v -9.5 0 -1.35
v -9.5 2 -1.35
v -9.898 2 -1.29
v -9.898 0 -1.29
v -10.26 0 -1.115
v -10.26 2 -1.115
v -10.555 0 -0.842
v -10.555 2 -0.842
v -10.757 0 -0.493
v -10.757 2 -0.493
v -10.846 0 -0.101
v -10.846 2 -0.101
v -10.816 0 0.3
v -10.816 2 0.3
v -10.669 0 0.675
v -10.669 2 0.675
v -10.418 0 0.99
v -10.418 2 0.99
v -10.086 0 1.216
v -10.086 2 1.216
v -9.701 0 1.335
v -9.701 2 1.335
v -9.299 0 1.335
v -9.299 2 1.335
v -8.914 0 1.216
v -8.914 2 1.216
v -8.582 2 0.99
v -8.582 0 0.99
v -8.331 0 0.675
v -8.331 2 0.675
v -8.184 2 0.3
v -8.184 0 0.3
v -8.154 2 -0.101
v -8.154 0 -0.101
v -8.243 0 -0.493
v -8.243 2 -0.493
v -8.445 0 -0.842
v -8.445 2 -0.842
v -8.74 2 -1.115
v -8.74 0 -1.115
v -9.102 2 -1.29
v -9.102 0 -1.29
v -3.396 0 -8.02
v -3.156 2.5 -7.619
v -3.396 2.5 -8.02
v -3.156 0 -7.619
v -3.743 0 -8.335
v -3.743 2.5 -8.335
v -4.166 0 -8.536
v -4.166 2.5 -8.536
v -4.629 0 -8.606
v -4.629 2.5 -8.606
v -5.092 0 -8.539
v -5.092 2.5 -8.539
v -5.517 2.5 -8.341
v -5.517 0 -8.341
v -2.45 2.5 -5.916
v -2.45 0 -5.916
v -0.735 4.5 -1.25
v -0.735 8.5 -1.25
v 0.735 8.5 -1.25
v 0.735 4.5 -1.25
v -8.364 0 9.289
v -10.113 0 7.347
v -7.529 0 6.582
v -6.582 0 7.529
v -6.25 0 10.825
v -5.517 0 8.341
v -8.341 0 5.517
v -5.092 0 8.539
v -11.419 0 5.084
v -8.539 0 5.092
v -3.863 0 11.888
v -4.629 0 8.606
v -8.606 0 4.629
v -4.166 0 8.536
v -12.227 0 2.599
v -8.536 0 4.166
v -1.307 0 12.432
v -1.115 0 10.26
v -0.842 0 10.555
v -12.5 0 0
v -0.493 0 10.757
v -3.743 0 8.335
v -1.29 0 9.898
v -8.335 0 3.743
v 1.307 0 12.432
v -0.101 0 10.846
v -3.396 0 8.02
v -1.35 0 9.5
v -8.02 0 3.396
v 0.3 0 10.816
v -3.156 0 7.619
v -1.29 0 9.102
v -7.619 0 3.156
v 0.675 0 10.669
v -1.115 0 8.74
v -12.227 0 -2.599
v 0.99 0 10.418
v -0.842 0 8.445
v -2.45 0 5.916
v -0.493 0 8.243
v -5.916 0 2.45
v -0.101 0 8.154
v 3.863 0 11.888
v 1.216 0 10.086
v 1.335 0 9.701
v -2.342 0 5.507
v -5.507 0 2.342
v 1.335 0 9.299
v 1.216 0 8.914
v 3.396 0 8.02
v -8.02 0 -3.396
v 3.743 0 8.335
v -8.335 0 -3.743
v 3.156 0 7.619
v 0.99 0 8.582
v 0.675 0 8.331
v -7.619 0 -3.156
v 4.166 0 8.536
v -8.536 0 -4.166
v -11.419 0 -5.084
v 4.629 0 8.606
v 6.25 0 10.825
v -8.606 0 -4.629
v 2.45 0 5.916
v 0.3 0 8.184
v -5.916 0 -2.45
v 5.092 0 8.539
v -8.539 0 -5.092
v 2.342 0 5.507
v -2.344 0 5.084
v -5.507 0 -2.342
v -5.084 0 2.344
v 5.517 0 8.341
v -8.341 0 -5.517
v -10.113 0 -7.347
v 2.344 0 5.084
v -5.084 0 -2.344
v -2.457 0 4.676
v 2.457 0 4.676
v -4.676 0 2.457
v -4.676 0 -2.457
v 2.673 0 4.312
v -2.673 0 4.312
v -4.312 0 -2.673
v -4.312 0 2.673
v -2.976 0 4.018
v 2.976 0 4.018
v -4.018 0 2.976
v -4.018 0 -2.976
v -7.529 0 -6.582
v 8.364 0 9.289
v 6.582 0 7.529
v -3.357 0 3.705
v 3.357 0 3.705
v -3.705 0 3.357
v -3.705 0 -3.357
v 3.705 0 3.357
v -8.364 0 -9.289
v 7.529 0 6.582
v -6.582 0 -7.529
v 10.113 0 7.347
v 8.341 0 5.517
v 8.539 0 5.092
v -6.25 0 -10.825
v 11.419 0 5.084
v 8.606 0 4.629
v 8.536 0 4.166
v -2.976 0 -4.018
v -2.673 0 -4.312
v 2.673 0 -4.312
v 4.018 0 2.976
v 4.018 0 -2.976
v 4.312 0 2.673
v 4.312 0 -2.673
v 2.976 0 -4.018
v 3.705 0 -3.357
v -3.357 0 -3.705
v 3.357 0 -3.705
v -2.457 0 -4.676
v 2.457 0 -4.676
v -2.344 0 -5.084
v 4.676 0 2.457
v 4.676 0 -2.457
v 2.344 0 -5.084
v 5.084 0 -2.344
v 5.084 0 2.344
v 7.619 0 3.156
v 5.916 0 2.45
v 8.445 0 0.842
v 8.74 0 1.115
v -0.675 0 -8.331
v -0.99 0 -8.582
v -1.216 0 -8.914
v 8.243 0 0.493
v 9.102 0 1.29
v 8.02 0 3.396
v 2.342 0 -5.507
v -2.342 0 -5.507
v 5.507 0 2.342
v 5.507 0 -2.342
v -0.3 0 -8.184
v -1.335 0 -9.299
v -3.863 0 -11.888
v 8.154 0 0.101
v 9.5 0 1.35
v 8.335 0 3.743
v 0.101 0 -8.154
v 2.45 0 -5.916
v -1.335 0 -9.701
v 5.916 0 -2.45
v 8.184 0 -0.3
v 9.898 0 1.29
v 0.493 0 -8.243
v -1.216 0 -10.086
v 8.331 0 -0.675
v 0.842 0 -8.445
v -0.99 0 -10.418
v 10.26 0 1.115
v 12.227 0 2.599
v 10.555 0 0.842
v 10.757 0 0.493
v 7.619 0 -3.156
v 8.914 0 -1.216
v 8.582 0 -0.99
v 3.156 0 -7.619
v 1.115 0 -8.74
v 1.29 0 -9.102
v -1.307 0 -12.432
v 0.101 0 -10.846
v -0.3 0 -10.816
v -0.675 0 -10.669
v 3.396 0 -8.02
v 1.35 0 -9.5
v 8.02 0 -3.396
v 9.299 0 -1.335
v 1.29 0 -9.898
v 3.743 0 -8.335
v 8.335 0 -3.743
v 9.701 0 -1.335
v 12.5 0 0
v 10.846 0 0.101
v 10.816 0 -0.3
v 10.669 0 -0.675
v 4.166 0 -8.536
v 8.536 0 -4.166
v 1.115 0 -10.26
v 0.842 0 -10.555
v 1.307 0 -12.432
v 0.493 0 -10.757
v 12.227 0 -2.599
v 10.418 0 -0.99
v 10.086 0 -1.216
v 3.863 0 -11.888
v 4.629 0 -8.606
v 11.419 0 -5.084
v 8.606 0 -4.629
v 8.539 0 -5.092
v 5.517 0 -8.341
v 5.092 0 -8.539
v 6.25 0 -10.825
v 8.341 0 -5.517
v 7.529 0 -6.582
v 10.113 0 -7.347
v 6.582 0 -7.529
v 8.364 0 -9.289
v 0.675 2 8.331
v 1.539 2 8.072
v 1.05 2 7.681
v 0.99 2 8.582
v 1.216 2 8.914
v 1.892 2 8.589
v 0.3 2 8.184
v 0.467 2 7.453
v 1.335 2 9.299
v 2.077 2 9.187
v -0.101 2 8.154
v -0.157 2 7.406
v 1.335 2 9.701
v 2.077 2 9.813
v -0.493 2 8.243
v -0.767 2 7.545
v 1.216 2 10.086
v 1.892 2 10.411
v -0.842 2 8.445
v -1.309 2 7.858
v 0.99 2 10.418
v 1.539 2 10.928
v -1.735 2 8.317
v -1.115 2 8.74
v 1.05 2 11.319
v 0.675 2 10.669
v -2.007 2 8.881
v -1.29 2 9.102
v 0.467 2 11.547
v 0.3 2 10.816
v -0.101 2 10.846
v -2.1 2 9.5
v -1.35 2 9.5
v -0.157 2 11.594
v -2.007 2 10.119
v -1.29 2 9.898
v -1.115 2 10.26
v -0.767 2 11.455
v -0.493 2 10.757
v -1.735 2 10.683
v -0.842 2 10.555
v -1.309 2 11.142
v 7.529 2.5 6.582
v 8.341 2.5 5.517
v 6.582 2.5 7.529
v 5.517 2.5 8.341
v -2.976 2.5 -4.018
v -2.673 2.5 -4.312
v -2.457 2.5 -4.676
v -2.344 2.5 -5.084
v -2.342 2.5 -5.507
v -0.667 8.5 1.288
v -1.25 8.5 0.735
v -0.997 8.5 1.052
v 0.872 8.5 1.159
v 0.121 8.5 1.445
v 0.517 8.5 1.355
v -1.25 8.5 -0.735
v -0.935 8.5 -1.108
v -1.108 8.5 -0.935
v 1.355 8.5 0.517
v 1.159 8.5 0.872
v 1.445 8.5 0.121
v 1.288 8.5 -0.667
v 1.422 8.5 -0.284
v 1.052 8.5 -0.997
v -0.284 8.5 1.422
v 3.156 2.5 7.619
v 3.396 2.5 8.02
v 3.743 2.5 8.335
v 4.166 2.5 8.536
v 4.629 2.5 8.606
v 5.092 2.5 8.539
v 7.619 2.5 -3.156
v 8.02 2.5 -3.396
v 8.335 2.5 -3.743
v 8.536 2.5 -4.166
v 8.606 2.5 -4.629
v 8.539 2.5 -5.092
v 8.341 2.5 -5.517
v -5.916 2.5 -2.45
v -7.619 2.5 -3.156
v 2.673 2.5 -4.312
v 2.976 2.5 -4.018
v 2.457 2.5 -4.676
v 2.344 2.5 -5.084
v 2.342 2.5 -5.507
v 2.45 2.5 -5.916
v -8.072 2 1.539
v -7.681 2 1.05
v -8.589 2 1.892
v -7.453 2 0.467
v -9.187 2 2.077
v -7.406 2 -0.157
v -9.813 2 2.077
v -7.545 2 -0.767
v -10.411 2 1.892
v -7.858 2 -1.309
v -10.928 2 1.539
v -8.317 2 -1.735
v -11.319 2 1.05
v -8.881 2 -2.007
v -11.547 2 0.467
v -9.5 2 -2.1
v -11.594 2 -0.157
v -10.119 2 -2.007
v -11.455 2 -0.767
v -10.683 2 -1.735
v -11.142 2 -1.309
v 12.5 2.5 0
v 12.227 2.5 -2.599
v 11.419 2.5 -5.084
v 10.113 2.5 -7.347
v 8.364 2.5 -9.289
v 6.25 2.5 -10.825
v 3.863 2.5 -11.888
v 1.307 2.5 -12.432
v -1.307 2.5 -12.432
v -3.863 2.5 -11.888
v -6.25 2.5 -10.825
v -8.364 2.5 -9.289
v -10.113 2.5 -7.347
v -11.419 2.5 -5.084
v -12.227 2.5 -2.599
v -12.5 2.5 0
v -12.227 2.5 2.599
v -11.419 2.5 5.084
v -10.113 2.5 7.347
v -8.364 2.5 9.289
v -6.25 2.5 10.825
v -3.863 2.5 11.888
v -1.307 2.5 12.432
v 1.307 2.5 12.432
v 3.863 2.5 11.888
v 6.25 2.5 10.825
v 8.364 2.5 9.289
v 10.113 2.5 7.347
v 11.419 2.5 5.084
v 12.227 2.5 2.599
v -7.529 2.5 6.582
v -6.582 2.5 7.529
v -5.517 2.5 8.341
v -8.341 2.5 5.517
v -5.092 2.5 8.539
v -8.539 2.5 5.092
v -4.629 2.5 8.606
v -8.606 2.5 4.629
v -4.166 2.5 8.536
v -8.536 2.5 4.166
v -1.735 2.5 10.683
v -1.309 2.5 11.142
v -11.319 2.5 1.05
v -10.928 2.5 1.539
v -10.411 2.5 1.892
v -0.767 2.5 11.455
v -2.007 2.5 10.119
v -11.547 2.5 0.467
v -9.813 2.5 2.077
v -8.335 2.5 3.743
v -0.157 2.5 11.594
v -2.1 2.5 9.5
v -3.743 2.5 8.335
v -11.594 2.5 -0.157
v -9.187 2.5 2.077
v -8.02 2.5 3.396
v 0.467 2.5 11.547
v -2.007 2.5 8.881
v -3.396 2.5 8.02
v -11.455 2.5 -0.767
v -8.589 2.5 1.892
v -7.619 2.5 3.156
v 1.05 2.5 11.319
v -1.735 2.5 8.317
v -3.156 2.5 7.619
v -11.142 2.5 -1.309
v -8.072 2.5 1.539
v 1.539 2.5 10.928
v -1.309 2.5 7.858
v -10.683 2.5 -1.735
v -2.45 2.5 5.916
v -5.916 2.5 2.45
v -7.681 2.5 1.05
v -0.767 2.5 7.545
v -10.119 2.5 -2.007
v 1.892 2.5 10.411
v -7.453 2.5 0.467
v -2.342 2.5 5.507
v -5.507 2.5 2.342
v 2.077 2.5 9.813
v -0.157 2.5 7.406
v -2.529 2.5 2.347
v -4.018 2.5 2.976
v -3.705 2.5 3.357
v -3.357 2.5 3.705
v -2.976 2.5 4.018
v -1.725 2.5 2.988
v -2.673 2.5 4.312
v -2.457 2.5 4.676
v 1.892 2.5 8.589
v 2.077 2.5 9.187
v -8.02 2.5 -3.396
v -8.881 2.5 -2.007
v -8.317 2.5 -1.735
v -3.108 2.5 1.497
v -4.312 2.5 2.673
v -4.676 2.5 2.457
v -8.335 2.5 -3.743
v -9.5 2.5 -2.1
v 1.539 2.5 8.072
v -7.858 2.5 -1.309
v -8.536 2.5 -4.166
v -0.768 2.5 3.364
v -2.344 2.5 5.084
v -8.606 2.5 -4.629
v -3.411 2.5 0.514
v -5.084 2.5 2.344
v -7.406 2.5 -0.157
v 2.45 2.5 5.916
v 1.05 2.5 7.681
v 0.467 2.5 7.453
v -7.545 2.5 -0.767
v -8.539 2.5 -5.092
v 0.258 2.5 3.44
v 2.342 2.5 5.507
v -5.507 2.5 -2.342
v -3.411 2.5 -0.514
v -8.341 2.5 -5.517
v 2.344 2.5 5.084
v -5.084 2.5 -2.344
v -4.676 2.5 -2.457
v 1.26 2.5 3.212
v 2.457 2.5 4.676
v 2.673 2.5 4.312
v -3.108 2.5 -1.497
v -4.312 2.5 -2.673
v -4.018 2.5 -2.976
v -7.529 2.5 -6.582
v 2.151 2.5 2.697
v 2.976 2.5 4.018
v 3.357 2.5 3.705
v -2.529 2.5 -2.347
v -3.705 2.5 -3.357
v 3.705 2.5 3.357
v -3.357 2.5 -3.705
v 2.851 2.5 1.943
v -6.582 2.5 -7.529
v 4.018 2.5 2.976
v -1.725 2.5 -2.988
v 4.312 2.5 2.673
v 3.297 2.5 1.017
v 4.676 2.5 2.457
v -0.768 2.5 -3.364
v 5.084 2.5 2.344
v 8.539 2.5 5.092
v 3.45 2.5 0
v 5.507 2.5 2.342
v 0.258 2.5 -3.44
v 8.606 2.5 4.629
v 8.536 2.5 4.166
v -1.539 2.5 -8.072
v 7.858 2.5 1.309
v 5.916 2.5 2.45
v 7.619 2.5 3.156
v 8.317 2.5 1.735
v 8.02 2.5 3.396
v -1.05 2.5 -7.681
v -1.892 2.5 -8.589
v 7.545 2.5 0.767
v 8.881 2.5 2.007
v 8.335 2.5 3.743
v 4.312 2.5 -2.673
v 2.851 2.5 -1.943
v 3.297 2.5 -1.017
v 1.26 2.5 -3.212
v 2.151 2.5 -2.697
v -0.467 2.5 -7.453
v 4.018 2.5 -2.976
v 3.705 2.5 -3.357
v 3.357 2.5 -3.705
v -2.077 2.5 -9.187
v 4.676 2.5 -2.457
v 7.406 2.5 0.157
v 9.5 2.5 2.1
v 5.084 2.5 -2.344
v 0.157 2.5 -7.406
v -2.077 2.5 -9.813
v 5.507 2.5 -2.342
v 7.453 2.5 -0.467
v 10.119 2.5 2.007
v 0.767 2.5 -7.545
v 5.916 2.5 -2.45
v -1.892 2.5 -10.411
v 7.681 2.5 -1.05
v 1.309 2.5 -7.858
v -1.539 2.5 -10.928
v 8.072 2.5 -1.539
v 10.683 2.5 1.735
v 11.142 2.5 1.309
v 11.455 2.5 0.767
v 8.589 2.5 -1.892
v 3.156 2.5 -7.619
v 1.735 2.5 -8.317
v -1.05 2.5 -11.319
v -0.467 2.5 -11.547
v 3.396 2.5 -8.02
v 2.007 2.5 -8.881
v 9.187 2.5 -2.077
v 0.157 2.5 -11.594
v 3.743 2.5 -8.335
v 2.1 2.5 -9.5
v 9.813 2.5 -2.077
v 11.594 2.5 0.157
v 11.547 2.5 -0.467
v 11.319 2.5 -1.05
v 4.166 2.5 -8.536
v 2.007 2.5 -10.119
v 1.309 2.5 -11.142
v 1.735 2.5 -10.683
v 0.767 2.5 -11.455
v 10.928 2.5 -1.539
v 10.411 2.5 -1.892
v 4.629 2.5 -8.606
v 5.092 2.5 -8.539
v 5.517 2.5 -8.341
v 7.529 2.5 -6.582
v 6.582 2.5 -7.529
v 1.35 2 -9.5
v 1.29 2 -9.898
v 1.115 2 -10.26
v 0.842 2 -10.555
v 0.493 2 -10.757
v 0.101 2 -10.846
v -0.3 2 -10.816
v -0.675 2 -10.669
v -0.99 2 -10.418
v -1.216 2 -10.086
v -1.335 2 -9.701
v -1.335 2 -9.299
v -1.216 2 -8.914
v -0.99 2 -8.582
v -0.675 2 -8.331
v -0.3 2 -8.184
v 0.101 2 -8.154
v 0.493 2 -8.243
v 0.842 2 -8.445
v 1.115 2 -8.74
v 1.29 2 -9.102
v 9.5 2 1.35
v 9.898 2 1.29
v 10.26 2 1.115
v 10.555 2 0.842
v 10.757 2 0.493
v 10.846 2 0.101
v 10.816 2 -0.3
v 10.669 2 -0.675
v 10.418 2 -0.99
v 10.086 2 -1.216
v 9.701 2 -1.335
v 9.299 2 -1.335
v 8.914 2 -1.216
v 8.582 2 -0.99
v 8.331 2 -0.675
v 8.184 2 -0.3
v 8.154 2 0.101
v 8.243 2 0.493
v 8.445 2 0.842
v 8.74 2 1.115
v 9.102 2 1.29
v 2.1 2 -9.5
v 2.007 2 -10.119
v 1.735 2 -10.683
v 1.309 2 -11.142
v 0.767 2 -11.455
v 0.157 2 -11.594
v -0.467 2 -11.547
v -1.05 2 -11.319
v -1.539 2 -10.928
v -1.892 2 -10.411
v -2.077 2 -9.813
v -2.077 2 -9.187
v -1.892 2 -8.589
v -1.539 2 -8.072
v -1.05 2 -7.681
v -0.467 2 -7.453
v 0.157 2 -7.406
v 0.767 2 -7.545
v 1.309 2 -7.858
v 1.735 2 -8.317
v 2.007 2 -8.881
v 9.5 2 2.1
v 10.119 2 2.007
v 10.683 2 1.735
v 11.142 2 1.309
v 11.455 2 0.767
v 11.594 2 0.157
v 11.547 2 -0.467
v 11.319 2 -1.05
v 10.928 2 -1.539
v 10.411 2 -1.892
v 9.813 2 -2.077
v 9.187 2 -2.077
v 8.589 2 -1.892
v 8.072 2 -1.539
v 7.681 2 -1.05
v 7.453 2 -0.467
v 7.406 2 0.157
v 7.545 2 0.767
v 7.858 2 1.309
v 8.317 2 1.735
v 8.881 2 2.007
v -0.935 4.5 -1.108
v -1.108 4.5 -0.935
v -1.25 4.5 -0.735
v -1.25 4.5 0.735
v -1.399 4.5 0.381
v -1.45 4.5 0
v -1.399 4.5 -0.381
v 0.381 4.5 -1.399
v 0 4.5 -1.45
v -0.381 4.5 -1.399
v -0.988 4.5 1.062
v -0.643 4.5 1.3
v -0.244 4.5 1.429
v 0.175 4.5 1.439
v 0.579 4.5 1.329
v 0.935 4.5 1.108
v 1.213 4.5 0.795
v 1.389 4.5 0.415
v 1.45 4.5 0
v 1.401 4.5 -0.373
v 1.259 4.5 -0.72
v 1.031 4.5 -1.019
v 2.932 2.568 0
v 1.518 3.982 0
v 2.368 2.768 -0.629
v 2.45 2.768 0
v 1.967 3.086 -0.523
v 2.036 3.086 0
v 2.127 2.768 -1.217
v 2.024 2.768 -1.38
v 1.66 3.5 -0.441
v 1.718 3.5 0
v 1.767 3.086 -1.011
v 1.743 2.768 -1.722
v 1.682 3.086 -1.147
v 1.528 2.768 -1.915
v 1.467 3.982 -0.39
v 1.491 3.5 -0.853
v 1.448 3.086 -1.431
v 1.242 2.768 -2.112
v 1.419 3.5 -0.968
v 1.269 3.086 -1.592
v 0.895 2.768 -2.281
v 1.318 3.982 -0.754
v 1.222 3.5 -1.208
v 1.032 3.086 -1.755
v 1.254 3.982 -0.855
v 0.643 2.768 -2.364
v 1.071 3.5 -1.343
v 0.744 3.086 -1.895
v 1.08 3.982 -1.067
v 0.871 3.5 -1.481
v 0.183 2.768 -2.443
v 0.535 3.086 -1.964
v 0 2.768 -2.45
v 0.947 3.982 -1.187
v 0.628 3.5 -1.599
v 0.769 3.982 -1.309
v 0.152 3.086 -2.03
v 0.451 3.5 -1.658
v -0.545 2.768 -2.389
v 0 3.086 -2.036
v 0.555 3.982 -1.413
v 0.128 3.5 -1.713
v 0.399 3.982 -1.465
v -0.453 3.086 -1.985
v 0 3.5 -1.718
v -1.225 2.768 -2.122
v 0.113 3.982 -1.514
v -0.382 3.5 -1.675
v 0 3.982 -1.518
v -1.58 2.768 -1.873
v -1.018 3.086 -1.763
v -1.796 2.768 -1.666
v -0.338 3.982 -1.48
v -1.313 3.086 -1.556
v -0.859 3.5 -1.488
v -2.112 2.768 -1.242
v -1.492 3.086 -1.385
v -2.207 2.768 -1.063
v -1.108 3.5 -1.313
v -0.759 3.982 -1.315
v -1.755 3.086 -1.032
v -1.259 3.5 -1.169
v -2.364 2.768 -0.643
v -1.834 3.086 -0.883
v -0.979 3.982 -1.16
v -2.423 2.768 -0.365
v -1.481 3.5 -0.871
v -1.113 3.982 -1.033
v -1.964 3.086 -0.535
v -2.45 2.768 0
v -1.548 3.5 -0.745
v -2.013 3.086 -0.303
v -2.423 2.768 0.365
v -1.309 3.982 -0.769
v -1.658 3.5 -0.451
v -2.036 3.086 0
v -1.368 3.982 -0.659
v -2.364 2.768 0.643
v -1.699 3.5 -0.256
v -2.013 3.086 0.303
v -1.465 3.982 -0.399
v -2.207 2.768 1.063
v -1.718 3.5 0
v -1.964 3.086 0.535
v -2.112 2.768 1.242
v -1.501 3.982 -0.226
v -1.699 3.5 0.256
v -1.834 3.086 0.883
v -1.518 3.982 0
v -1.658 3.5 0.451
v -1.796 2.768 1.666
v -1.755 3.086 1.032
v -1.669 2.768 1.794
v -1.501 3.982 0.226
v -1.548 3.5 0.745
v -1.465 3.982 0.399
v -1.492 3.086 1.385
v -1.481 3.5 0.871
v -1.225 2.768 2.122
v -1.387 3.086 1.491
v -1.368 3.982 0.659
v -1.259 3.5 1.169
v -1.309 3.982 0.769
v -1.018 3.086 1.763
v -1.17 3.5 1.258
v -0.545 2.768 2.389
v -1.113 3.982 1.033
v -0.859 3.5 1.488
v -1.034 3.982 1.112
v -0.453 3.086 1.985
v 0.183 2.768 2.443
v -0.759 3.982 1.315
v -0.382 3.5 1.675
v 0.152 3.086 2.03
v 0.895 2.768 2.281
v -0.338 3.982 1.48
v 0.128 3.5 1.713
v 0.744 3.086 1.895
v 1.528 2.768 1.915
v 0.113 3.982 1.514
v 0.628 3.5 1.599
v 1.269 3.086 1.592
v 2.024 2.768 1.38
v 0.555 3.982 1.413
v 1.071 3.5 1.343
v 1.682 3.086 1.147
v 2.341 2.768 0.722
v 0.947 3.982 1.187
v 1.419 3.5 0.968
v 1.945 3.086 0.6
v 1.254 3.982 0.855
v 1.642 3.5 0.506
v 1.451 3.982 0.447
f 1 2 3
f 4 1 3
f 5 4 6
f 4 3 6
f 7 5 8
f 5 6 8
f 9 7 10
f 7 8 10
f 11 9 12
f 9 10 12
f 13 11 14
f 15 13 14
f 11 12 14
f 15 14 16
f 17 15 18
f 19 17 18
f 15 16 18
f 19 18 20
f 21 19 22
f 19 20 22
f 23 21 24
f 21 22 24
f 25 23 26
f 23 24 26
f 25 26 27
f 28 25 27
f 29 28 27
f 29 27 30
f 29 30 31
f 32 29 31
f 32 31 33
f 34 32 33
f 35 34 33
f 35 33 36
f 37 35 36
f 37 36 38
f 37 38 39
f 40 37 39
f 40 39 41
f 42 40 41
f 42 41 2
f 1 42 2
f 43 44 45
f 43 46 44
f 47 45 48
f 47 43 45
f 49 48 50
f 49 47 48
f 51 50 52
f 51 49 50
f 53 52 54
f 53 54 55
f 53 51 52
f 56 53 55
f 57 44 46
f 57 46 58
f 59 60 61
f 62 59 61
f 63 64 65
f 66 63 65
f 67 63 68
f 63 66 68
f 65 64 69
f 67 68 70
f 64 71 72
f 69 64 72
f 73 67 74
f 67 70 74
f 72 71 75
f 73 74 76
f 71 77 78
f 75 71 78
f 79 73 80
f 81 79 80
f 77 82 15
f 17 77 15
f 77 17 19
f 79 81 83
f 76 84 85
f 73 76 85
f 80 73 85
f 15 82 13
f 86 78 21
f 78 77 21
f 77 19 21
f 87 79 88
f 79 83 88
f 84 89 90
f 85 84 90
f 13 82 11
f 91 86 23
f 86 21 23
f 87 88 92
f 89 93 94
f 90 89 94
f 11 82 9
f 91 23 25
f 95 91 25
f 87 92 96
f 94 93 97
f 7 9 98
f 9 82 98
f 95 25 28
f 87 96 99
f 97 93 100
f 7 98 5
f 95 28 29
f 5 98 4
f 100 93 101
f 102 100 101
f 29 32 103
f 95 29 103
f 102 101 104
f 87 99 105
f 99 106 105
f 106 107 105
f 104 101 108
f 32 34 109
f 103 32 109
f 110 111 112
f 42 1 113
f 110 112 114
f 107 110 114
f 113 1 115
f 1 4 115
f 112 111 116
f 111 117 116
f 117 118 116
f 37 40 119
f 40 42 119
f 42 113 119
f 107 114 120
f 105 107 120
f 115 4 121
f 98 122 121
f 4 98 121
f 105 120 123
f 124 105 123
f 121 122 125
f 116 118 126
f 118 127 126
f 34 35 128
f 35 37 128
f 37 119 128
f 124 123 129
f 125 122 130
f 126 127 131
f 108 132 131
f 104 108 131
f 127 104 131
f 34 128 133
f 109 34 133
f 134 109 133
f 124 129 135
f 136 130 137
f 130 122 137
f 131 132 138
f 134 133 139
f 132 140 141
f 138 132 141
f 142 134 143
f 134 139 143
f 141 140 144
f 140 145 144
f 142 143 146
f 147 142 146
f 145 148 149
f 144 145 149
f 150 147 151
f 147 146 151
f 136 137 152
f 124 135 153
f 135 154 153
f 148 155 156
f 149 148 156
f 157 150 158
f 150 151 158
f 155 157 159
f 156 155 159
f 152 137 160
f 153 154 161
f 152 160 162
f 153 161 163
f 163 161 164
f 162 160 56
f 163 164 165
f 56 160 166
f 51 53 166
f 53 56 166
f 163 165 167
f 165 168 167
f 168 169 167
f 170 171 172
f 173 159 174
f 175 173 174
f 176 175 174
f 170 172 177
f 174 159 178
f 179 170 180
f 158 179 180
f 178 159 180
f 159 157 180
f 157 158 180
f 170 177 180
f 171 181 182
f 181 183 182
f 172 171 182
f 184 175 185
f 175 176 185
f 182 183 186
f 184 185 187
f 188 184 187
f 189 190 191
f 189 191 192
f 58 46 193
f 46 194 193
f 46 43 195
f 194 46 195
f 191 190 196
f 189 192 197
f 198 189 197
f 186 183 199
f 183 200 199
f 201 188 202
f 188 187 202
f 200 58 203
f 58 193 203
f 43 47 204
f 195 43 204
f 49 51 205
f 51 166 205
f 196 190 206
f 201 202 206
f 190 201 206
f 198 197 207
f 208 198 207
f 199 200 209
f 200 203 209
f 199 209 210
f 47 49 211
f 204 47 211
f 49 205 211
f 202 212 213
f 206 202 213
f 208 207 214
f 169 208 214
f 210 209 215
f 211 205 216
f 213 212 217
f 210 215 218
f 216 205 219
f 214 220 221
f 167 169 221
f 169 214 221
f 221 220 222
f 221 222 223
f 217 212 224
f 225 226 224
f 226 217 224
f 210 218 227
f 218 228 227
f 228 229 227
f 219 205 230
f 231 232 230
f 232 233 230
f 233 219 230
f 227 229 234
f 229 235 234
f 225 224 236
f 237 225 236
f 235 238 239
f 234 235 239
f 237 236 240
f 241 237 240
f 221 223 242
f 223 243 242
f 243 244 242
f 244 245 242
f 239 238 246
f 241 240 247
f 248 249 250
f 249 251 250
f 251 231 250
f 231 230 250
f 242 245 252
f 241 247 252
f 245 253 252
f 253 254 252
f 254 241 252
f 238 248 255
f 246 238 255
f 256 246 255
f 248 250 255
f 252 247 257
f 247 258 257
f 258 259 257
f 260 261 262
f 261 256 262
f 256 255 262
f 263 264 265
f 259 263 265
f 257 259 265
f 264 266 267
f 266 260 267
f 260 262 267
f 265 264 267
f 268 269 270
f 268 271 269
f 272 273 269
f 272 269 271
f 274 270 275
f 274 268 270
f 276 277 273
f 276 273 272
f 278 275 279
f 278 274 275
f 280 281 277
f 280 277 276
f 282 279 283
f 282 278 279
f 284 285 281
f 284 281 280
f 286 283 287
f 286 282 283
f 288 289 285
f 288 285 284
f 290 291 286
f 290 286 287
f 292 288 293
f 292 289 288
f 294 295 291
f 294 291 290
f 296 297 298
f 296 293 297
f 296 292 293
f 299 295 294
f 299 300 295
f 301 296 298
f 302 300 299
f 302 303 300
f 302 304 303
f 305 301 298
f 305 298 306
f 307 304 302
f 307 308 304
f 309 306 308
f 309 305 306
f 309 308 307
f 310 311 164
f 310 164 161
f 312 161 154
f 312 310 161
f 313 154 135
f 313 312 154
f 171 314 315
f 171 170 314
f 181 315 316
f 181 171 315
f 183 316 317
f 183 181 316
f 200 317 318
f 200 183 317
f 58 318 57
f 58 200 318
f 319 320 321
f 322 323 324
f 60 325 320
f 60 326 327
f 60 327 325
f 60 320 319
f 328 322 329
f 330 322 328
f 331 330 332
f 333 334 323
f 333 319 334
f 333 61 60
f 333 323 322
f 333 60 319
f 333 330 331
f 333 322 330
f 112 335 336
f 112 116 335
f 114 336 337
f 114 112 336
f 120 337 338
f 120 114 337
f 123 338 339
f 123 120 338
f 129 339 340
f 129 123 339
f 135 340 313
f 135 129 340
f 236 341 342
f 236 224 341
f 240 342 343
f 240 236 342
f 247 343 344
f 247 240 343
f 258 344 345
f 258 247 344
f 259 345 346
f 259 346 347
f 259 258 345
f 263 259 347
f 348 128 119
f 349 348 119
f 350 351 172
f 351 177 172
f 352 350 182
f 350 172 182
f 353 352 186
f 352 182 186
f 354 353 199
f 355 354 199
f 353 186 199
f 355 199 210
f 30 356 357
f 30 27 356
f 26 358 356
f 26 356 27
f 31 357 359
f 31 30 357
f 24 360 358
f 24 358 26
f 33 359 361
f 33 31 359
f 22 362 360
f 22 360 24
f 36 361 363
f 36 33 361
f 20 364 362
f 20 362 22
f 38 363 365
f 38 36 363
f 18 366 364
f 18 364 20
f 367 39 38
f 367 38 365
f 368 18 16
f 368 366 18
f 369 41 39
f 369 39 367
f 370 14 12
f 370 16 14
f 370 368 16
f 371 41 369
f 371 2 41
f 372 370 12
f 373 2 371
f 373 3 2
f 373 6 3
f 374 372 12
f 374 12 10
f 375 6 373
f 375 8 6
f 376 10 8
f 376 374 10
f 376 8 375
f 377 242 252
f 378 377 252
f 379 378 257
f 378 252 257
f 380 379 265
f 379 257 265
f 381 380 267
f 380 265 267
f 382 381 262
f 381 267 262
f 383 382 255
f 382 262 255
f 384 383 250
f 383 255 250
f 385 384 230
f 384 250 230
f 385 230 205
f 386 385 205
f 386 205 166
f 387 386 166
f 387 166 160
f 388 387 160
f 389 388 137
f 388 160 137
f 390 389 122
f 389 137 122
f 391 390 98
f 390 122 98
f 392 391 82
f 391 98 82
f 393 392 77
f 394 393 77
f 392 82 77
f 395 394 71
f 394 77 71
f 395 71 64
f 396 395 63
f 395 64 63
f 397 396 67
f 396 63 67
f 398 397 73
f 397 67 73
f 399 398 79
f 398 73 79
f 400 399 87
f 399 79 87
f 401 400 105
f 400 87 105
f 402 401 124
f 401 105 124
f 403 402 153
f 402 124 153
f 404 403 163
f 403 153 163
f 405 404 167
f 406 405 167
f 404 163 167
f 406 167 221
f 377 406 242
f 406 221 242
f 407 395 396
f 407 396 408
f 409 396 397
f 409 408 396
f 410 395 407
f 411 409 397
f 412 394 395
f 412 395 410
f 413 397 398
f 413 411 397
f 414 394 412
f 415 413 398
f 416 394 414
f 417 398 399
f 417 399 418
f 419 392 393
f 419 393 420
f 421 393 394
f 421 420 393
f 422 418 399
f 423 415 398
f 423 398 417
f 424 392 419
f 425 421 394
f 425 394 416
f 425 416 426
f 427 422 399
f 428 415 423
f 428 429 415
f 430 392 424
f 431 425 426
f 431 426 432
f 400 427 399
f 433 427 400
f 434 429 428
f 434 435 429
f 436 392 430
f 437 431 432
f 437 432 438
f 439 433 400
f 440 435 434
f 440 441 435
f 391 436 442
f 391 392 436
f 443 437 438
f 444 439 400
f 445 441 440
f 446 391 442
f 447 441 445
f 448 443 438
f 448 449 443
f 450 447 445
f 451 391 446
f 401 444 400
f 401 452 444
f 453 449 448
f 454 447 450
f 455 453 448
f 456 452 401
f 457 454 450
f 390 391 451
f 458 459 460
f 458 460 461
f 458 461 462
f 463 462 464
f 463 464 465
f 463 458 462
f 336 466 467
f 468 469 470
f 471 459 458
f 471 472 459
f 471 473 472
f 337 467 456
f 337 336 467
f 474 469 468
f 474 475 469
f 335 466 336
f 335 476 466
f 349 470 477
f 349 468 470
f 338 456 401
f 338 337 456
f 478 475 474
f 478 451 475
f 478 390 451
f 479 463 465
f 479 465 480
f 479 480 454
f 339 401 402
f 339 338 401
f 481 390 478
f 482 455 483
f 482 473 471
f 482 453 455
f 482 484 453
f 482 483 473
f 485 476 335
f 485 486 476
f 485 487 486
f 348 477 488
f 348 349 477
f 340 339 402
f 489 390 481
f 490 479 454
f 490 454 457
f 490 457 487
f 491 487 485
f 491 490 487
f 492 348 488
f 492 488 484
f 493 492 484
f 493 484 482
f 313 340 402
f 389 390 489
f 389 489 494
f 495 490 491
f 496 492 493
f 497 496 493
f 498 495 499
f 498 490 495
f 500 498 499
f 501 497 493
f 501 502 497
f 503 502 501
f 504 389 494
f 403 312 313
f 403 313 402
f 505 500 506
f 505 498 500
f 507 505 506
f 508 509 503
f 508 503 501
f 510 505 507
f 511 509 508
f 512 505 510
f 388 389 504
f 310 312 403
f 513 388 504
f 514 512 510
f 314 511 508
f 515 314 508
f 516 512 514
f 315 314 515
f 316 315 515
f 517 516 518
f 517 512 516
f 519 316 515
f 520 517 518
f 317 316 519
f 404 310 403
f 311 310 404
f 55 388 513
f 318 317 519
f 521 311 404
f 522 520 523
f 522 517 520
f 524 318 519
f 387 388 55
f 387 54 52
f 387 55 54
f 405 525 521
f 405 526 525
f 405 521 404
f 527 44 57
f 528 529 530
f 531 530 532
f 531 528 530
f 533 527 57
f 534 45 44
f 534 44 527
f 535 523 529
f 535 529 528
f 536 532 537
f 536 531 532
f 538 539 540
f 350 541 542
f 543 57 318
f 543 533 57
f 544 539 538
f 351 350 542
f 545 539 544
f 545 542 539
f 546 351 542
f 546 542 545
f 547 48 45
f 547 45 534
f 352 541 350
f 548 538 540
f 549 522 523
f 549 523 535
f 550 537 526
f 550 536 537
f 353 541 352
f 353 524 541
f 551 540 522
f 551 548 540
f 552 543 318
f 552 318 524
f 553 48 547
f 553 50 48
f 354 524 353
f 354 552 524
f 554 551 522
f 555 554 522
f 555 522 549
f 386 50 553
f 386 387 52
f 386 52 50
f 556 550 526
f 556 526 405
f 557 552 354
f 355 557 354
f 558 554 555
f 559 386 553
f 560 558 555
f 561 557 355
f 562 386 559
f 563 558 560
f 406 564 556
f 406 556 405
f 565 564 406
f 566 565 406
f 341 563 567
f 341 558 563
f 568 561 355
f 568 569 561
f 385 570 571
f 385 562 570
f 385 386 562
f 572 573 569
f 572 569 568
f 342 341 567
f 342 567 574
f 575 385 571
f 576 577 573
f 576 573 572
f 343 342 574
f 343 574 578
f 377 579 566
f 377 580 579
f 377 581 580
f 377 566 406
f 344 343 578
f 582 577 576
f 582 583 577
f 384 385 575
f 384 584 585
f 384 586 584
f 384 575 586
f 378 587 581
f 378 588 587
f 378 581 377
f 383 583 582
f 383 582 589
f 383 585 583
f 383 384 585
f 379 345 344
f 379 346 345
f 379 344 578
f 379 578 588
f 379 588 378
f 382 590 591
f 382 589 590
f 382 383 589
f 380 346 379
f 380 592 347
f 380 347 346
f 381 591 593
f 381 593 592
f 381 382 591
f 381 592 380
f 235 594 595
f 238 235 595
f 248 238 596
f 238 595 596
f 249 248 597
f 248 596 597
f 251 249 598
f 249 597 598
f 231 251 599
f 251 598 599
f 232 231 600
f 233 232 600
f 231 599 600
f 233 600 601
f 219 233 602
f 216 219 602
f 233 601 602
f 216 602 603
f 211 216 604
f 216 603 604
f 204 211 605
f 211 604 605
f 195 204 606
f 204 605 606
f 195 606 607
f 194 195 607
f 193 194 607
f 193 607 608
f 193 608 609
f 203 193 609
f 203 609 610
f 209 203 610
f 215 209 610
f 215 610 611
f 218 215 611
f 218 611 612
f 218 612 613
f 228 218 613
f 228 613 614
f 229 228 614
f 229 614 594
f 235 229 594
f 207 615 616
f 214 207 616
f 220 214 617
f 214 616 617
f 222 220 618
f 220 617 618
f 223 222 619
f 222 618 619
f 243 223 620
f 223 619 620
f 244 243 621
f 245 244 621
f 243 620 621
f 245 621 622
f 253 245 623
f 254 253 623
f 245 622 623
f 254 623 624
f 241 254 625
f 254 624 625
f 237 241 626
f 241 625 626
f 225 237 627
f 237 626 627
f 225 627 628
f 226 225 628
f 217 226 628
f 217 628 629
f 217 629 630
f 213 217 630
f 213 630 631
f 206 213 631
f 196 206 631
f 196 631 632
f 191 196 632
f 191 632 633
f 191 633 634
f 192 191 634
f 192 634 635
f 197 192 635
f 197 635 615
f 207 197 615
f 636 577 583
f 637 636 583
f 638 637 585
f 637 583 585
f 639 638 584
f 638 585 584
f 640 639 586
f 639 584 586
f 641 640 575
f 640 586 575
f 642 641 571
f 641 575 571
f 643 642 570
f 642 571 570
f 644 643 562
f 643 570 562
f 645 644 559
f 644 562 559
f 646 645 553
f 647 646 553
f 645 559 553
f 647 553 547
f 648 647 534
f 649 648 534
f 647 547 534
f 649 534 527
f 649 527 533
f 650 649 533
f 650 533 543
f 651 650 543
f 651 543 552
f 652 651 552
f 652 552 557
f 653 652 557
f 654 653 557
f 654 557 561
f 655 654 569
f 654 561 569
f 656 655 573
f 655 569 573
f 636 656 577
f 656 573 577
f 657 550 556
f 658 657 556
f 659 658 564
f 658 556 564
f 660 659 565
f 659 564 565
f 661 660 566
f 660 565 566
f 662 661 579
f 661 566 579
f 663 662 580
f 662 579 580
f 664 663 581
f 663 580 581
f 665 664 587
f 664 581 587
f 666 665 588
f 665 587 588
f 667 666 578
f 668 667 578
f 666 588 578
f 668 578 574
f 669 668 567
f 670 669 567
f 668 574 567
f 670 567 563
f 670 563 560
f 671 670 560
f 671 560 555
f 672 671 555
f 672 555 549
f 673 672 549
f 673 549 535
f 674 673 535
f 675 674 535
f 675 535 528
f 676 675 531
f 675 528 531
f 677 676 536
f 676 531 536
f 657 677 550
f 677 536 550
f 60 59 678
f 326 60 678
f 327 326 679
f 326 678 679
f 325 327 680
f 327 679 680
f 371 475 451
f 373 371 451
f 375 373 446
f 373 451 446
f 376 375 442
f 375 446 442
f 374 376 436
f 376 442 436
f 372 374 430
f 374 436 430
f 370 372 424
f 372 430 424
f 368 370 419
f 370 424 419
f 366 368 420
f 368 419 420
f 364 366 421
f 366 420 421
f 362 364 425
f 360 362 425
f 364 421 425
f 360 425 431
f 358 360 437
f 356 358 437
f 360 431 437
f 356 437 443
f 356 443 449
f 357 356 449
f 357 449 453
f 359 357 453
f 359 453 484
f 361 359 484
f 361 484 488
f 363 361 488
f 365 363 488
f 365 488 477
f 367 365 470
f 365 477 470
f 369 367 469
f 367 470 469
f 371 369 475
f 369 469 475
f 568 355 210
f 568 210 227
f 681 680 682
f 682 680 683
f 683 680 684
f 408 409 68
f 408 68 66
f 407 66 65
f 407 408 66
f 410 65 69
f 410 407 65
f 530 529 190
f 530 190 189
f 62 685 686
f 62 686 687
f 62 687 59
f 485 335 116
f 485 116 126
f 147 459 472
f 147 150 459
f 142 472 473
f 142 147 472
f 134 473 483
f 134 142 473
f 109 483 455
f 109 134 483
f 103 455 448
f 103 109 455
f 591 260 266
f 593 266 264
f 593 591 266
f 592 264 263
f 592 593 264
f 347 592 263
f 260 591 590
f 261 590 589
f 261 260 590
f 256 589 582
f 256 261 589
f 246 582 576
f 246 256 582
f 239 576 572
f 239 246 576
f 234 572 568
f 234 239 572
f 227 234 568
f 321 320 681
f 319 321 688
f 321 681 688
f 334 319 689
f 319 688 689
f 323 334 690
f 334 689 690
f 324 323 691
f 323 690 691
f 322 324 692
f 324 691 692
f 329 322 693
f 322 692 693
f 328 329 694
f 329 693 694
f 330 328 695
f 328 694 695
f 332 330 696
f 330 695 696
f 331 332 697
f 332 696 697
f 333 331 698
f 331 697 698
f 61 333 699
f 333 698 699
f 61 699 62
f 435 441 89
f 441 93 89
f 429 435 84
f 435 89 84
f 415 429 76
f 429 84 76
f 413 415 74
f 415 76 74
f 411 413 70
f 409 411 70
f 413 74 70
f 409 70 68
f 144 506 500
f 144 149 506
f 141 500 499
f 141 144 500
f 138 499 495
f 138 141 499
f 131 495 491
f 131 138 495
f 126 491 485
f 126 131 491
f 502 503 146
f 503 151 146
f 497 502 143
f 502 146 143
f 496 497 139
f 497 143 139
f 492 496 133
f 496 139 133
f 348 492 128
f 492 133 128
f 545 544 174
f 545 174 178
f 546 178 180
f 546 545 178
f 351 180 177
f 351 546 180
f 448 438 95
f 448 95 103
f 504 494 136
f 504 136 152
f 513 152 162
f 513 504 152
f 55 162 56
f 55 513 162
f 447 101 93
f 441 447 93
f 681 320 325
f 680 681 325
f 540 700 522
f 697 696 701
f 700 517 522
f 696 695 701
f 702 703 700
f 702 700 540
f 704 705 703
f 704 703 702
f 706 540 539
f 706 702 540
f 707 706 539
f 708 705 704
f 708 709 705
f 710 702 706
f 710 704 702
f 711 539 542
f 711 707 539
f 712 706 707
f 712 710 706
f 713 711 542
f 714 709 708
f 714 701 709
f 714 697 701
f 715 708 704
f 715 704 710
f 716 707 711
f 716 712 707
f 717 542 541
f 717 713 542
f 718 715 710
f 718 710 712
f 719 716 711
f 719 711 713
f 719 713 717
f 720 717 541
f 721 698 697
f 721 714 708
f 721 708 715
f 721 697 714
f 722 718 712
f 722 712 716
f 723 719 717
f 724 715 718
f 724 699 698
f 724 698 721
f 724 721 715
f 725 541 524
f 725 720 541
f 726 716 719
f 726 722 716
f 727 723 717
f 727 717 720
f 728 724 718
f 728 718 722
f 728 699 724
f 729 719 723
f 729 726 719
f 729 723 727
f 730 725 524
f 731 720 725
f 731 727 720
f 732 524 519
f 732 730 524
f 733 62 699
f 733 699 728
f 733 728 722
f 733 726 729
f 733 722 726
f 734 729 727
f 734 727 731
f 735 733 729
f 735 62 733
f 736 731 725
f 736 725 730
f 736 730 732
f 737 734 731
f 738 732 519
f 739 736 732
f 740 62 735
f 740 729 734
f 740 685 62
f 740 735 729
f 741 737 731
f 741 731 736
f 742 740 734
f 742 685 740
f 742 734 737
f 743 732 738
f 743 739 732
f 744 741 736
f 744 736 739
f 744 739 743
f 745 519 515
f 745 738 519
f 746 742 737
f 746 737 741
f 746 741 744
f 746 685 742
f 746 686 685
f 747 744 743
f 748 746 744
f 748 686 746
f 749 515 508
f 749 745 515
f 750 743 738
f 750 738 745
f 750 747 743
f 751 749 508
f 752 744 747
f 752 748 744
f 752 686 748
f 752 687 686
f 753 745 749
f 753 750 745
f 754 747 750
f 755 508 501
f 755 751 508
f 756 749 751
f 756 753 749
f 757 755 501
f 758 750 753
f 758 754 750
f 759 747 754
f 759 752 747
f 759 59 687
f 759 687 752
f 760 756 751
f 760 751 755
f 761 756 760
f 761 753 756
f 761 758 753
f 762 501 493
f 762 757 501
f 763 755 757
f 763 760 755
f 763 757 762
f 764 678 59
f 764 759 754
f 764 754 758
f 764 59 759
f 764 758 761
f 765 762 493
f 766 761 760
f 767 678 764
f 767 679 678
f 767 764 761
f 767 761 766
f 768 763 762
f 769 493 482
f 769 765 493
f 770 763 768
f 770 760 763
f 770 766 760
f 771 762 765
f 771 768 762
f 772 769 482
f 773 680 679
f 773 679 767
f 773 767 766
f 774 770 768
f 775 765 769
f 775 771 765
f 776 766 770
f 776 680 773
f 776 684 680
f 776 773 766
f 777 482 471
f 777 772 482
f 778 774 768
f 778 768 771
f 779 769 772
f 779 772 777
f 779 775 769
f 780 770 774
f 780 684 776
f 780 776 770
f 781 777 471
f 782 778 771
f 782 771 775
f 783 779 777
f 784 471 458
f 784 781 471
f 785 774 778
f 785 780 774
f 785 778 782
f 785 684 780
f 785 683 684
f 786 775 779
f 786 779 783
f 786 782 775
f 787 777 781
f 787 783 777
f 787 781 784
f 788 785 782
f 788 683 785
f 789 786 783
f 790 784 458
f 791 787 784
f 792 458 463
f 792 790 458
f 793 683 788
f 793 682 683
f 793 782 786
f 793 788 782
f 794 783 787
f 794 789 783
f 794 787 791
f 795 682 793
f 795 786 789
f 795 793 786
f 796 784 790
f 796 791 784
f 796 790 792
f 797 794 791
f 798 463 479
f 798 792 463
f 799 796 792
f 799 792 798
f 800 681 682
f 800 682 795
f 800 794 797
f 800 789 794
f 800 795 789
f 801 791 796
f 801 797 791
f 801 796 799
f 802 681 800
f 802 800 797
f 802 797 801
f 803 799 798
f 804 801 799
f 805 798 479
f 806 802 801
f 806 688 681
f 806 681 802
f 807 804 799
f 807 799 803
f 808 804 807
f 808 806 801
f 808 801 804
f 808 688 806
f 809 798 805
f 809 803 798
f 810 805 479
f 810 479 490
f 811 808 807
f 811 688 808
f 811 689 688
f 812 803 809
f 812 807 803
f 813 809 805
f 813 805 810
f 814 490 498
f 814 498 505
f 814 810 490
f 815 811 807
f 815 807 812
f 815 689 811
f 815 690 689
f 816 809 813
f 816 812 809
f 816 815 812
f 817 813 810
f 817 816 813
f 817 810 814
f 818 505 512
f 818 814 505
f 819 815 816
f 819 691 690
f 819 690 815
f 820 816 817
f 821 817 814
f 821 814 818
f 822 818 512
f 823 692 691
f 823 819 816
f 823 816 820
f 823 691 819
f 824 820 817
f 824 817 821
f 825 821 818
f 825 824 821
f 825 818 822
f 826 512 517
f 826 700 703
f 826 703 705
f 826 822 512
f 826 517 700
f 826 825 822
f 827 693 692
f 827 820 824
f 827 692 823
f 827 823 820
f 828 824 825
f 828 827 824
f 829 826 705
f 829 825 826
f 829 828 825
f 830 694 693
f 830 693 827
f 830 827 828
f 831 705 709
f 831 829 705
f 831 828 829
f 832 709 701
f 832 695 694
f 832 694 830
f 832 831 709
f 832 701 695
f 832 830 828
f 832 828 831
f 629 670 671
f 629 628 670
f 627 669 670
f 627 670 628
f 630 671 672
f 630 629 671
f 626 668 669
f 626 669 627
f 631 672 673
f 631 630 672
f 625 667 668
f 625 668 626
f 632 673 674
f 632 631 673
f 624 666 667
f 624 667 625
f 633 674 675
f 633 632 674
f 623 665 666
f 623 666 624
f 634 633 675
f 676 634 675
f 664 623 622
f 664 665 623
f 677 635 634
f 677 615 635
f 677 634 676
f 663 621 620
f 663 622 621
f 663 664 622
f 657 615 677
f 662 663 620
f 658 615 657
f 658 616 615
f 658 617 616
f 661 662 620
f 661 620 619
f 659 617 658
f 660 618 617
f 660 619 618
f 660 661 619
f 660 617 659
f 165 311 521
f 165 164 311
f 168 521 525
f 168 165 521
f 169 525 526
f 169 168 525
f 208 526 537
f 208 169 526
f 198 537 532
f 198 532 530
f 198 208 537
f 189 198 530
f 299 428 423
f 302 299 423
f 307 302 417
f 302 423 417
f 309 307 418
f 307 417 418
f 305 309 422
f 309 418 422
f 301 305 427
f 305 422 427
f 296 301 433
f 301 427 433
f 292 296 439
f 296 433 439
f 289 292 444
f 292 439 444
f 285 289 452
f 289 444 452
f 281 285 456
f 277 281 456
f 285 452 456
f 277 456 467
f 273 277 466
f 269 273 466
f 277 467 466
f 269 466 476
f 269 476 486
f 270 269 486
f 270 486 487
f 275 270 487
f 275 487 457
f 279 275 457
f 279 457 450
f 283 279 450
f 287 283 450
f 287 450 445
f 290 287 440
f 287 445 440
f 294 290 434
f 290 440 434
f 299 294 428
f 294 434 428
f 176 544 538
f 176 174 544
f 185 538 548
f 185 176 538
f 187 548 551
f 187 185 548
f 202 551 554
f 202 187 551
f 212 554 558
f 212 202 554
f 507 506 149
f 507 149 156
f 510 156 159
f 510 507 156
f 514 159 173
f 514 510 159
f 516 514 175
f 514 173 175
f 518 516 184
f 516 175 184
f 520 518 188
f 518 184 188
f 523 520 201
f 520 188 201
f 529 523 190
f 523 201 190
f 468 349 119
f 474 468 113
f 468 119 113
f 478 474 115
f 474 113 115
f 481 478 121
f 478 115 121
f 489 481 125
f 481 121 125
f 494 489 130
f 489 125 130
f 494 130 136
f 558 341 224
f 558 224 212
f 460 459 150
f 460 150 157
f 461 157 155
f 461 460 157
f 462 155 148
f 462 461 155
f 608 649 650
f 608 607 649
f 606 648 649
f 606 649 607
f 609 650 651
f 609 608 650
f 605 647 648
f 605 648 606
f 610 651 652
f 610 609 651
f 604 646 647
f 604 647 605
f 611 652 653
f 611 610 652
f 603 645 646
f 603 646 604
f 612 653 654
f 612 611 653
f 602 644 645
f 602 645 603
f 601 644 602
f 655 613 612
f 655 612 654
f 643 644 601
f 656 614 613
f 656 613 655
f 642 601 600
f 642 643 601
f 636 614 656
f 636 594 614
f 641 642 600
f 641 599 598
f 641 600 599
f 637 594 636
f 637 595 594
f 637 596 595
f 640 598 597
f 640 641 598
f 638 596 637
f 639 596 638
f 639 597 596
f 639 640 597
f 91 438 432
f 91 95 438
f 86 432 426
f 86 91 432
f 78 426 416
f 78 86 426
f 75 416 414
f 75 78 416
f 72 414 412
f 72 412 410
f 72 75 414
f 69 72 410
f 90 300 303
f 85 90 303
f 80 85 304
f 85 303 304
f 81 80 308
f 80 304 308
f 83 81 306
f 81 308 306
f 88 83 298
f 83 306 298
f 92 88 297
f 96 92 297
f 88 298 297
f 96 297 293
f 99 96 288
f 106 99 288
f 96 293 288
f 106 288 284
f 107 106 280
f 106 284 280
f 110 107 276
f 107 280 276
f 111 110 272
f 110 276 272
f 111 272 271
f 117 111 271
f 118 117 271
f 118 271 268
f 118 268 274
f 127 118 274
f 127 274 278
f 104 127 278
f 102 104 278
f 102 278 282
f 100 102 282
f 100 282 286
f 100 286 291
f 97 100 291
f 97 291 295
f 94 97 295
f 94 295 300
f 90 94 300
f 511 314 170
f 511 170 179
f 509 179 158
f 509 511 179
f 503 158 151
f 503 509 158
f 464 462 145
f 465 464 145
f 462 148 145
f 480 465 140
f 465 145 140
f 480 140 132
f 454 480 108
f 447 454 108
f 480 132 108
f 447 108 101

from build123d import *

# Parameters (mm, degrees)
SKETCH1_R                = 12.5
BOSS_EXTRUDE1_DEPTH      = 2.5
SKETCH2_R                = 1.35
CUT_EXTRUDE1_DEPTH       = 3.5
SKETCH4_R                = 2.1
CUT_EXTRUDE2_DEPTH       = 0.5
CUT_EXTRUDE3_DEPTH       = 3.5
FILLET3_R                = 1.6
CIRPATTERN1_COUNT        = 4
FILLET3_OF_CIRPATTERN1_R = 1.6
SKETCH3_R                = 1.45
BOSS_EXTRUDE2_DEPTH      = 6
FILLET2_R                = 2
SKETCH6_W                = 1.469693846
SKETCH6_H                = 0.4
SKETCH6_W_2              = 0.4
SKETCH6_H_2              = 1.469693846
CUT_EXTRUDE4_DEPTH       = 4


with BuildPart() as part:
    # Sketch1 → Boss-Extrude1 (new body)
    with BuildSketch(Plane(origin=(0, 0, 0), x_dir=(1, 0, 0), z_dir=(0, 1, 0))):
        Circle(SKETCH1_R)
    extrude(amount=BOSS_EXTRUDE1_DEPTH)

    # Sketch2 → Cut-Extrude1 (cut, through all)
    with BuildSketch(Plane(origin=(0, 2.5, 0), x_dir=(1, 0, 0), z_dir=(0, 1, 0))):
        with Locations((0, 9.5)):
            Circle(SKETCH2_R)
    cut_extrude1 = extrude(amount=-CUT_EXTRUDE1_DEPTH, mode=Mode.SUBTRACT)

    # Sketch4 → Cut-Extrude2 (cut)
    with BuildSketch(Plane(origin=(0, 2.5, 0), x_dir=(1, 0, 0), z_dir=(0, 1, 0))):
        with Locations((0, 9.5)):
            Circle(SKETCH4_R)
    cut_extrude2 = extrude(amount=-CUT_EXTRUDE2_DEPTH, mode=Mode.SUBTRACT)

    # Sketch5 → Cut-Extrude3 (cut, through all)
    with BuildSketch(Plane(origin=(0, 2.5, 0), x_dir=(1, 0, 0), z_dir=(0, 1, 0))):
        with BuildLine():
            Line((1.913417162, 4.619397663), (3.826834324, 9.238795325))
            ThreePointArc((3.826834324, 9.238795325), (7.071067812, 7.071067812), (9.238795325, 3.826834324))
            Line((9.238795325, 3.826834324), (4.619397663, 1.913417162))
            ThreePointArc((4.619397663, 1.913417162), (3.535533906, 3.535533906), (1.913417162, 4.619397663))
        make_face()
    cut_extrude3 = extrude(amount=-CUT_EXTRUDE3_DEPTH, mode=Mode.SUBTRACT)

    # Fillet3
    fillet3_edges = [part.edges().sort_by_distance(p)[0] for p in [
        (3.826834324, 1.25, -9.238795325),
        (9.238795325, 1.25, -3.826834324),
        (4.619397663, 1.25, -1.913417162),
        (1.913417162, 1.25, -4.619397663),
    ]]
    fillet(fillet3_edges, radius=FILLET3_R)

    # CirPattern1: Cut-Extrude1, Cut-Extrude2, Cut-Extrude3 ×4 about axis
    cirpattern1_axis = Axis((0, 0, 0), (0, 1, 0))
    for i in range(1, CIRPATTERN1_COUNT):
        add(cut_extrude1.rotate(cirpattern1_axis, i * 360 / CIRPATTERN1_COUNT), mode=Mode.SUBTRACT)
        add(cut_extrude2.rotate(cirpattern1_axis, i * 360 / CIRPATTERN1_COUNT), mode=Mode.SUBTRACT)
        add(cut_extrude3.rotate(cirpattern1_axis, i * 360 / CIRPATTERN1_COUNT), mode=Mode.SUBTRACT)

    # Fillet3 of CirPattern1
    fillet3_of_cirpattern1_edges = [part.edges().sort_by_distance(p)[0] for p in [
        (-9.238795325, 1.25, -3.826834324),
        (-3.826834324, 1.25, -9.238795325),
        (-1.913417162, 1.25, -4.619397663),
        (-4.619397663, 1.25, -1.913417162),
        (-3.826834324, 1.25, 9.238795325),
        (-9.238795325, 1.25, 3.826834324),
        (-4.619397663, 1.25, 1.913417162),
        (-1.913417162, 1.25, 4.619397663),
        (9.238795325, 1.25, 3.826834324),
        (3.826834324, 1.25, 9.238795325),
        (1.913417162, 1.25, 4.619397663),
        (4.619397663, 1.25, 1.913417162),
    ]]
    fillet(fillet3_of_cirpattern1_edges, radius=FILLET3_OF_CIRPATTERN1_R)

    # Sketch3 → Boss-Extrude2 (add)
    with BuildSketch(Plane(origin=(0, 2.5, 0), x_dir=(1, 0, 0), z_dir=(0, 1, 0))):
        Circle(SKETCH3_R)
    extrude(amount=BOSS_EXTRUDE2_DEPTH)

    # Fillet2
    fillet2_edges = [part.edges().sort_by_distance(p)[0] for p in [
        (-1.45, 2.5, 0),
    ]]
    fillet(fillet2_edges, radius=FILLET2_R)

    # Sketch6 → Cut-Extrude4 (cut)
    with BuildSketch(Plane(origin=(0, 8.5, 0), x_dir=(1, 0, 0), z_dir=(0, 1, 0))):
        with Locations((0, 1.45)):
            Rectangle(SKETCH6_W, SKETCH6_H)
        with Locations((-1.45, 0)):
            Rectangle(SKETCH6_W_2, SKETCH6_H_2)
    extrude(amount=-CUT_EXTRUDE4_DEPTH, mode=Mode.SUBTRACT)


solid = part.part
